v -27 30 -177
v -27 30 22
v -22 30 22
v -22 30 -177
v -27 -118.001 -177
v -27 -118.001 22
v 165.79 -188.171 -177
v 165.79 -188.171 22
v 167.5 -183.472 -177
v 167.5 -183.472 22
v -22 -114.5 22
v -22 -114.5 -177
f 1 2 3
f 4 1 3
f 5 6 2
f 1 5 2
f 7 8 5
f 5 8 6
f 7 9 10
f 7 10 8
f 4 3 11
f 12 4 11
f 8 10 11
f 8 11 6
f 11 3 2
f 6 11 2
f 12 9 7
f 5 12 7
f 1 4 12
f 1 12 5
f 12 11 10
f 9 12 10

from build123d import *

# Parameters (mm, degrees)
BOSS_EXTRUDE1_START = 22
BOSS_EXTRUDE1_DEPTH = 199


with BuildPart() as part:
    # Sketch1 → Boss-Extrude1 (new body)
    with BuildSketch(Plane.XY.offset(BOSS_EXTRUDE1_START)):
        Polygon((-22, 30), (-22, -114.5), (167.5, -183.472359393), (165.789899283, -188.170822497), (-27, -118.001037691), (-27, 30), align=None)
    extrude(amount=-BOSS_EXTRUDE1_DEPTH)


solid = part.part
